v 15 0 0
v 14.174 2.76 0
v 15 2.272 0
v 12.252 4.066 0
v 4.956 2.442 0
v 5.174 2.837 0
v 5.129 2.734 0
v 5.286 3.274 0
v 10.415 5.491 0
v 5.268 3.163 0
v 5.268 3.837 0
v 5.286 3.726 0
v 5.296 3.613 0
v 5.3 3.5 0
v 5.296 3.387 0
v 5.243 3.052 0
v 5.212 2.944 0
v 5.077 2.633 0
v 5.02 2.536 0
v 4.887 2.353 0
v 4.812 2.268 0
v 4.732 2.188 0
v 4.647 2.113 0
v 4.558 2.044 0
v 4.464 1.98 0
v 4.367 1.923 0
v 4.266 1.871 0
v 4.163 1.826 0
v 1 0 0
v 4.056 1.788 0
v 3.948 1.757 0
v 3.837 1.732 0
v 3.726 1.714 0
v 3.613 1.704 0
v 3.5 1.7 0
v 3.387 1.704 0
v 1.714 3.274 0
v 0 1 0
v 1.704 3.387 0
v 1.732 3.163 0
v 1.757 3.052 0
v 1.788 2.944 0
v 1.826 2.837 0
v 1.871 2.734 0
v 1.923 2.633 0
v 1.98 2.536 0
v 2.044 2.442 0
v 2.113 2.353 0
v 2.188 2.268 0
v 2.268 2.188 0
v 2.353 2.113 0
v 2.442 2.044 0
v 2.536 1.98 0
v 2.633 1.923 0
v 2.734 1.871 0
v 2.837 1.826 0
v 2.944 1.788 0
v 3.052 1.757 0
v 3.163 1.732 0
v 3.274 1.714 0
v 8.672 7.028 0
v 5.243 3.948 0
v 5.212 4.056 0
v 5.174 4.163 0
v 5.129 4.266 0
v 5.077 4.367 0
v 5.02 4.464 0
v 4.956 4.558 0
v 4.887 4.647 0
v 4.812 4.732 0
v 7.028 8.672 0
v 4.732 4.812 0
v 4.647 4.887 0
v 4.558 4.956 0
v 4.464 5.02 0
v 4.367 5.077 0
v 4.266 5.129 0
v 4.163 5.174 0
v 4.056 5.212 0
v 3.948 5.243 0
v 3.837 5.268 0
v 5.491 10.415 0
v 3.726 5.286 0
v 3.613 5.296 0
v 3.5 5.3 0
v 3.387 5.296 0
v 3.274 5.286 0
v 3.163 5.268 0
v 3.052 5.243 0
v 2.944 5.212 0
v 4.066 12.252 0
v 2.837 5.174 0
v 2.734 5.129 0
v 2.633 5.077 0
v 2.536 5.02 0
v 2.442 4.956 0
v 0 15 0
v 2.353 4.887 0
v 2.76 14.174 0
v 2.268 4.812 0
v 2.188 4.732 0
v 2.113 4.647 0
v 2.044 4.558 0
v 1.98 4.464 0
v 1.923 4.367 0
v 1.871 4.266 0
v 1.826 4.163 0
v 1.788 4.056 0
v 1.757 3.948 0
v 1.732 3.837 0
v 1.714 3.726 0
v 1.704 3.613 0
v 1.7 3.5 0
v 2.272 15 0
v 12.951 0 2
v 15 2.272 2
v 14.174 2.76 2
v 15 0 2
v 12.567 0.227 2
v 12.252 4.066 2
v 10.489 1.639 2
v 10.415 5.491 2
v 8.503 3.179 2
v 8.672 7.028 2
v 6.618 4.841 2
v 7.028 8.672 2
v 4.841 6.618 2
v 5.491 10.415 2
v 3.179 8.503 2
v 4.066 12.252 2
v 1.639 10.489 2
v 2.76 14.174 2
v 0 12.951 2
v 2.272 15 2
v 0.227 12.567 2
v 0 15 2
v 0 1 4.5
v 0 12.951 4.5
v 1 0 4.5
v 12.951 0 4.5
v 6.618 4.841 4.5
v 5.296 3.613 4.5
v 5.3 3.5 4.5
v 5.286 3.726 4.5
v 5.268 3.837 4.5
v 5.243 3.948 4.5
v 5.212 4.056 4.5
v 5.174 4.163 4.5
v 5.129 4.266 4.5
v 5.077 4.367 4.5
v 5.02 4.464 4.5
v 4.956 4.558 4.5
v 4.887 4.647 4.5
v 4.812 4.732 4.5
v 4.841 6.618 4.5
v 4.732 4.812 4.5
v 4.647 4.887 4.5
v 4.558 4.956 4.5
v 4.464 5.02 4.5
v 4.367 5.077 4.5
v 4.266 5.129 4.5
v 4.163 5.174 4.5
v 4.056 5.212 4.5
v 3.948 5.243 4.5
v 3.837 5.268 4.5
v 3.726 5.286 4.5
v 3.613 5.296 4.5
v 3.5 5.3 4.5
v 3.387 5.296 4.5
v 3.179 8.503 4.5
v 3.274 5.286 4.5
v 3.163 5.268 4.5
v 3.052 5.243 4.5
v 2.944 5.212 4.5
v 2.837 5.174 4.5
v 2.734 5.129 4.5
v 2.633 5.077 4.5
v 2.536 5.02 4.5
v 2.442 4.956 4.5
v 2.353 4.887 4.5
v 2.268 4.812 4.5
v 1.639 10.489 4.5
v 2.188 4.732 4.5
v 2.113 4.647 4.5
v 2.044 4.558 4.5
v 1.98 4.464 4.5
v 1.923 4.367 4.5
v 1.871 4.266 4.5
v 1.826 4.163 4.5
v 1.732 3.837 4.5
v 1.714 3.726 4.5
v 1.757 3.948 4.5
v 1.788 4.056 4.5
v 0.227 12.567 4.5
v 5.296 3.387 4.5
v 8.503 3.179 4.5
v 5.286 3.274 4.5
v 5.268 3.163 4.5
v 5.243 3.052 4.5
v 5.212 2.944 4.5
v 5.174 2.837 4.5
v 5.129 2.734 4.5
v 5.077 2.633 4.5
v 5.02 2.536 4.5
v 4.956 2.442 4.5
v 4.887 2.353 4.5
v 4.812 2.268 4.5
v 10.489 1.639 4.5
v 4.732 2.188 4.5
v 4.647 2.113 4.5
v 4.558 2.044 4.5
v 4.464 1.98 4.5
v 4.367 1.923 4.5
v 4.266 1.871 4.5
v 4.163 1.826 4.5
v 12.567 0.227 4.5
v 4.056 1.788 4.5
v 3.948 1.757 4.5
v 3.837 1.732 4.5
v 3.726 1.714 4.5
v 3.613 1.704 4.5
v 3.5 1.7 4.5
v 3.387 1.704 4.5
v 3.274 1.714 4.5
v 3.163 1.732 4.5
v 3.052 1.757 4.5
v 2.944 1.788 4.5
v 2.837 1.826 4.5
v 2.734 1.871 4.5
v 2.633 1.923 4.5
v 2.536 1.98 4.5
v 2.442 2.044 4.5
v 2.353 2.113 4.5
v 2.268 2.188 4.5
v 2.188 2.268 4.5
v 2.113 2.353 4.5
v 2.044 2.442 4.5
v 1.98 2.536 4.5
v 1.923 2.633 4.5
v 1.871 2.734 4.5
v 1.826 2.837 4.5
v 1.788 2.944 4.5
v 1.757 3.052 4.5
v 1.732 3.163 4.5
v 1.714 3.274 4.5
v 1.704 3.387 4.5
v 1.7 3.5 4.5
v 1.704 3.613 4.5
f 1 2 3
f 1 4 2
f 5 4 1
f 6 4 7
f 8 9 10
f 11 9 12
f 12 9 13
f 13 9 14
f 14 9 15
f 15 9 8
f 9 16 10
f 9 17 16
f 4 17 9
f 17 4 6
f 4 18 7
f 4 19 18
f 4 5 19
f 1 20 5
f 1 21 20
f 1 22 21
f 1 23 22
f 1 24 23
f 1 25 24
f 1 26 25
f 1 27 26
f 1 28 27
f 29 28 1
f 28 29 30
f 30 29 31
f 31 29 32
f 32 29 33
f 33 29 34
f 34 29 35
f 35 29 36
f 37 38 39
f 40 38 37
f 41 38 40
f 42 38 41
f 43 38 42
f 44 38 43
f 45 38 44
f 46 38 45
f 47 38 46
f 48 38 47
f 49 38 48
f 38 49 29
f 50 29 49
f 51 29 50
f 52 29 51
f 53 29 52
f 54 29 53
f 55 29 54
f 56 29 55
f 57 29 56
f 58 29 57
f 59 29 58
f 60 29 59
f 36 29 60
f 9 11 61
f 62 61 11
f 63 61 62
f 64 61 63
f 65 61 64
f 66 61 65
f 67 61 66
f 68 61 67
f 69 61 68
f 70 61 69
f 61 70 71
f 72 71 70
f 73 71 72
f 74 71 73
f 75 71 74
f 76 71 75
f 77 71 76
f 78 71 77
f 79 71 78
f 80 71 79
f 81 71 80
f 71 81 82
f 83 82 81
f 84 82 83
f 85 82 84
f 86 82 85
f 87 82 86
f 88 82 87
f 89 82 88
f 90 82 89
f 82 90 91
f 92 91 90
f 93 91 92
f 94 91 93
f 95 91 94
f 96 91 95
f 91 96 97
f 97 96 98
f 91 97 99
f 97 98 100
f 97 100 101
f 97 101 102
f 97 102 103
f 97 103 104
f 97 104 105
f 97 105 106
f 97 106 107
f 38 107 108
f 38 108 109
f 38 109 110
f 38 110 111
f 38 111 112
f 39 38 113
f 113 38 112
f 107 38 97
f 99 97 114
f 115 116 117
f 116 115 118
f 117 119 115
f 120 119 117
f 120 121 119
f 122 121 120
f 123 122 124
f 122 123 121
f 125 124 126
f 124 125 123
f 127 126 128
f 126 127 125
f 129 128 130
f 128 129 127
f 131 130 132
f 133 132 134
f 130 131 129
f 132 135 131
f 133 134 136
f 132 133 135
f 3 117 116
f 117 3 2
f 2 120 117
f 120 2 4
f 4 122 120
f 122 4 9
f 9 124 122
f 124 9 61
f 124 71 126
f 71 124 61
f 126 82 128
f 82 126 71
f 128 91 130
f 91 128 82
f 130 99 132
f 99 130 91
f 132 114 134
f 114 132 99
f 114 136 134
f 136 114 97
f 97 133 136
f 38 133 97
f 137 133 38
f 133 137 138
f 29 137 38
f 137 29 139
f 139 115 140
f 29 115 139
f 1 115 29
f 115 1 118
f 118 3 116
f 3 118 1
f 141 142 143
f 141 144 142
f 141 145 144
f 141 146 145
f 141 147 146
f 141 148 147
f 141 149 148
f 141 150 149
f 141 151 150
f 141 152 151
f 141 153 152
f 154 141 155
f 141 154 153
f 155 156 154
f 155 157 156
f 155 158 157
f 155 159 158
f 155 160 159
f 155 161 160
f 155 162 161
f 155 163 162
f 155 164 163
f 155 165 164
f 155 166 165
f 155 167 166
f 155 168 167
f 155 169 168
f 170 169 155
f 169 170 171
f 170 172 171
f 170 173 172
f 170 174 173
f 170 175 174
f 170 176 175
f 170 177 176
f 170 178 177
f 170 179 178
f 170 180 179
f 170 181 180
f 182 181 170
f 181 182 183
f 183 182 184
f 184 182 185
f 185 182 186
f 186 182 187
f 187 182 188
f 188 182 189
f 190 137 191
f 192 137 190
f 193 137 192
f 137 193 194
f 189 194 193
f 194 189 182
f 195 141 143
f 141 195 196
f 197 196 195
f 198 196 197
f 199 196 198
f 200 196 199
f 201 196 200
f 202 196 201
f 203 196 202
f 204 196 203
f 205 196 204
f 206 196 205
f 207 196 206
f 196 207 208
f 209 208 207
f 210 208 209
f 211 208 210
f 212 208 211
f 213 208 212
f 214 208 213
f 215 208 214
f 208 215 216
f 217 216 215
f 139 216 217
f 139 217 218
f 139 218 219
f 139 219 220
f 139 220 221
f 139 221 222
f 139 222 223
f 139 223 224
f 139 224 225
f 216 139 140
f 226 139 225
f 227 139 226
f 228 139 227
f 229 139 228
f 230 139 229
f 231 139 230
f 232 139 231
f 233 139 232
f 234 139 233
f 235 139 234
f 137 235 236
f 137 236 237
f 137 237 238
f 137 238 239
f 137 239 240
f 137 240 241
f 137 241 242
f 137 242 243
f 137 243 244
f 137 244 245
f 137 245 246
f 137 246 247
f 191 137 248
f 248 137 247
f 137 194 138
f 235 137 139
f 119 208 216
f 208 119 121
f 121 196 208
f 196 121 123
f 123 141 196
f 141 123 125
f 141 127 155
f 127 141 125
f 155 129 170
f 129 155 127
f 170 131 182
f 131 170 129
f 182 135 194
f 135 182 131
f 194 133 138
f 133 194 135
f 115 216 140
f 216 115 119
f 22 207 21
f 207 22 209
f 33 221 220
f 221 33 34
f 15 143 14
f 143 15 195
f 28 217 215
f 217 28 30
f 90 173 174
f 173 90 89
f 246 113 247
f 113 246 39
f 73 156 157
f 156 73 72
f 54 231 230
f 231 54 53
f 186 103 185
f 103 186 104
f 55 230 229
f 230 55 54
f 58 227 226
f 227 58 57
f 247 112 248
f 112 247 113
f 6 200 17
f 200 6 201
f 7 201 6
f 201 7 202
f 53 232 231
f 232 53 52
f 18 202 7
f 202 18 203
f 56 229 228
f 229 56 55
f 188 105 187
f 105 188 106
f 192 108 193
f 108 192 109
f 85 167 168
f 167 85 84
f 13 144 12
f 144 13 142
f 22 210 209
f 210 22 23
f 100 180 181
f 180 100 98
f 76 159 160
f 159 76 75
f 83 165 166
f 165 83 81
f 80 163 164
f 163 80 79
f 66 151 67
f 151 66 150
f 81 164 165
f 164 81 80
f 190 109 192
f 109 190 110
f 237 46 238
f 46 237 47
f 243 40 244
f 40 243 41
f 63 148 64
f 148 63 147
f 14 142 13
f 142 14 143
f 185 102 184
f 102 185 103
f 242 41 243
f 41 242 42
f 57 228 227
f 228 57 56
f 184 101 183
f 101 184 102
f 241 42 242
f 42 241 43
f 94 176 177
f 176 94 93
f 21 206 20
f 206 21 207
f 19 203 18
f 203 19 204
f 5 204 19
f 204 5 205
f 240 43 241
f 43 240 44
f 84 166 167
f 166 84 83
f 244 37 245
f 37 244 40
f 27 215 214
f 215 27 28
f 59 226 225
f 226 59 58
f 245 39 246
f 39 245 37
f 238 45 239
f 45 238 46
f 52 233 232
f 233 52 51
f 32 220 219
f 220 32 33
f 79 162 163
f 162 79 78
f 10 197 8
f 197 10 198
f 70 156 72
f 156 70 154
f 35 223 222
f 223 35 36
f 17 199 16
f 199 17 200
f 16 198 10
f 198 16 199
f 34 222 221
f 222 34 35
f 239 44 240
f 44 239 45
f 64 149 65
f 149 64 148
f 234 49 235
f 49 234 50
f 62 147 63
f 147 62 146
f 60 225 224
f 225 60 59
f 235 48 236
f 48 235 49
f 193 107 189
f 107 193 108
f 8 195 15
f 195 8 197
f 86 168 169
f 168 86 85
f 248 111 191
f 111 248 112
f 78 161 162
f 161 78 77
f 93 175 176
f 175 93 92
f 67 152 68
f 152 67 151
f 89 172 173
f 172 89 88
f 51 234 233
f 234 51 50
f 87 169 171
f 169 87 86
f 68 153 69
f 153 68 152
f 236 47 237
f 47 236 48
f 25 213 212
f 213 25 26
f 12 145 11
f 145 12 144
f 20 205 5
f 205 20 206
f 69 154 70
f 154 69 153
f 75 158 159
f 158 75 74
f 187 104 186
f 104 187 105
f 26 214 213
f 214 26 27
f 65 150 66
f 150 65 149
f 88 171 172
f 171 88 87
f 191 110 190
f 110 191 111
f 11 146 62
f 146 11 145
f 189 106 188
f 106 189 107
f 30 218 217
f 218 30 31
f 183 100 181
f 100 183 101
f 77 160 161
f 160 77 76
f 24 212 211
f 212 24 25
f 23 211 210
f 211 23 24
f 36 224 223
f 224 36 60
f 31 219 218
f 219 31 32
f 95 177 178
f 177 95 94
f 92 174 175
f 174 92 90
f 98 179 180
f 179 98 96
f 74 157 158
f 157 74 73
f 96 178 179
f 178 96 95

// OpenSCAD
$fn=100;

width = 15;

module outer_poly () {
    polygon ([
        [0,0],
        [0,width],
        [3,width],
        [width,3],
        [width,0]
    ]);
};

difference () {
    union () {
        linear_extrude (2) {
            difference () {
                outer_poly ();
                translate ([34,34]) circle (37);
                circle (1, $fn=4);
            }
        }
        linear_extrude (4.5) {
            difference () {
                outer_poly ();
                translate ([34,34]) circle (40);
                circle (1, $fn=4);
            }
        }
    }
    translate ([3.5, 3.5, -0.5]) linear_extrude (6) circle (1.8);
}
